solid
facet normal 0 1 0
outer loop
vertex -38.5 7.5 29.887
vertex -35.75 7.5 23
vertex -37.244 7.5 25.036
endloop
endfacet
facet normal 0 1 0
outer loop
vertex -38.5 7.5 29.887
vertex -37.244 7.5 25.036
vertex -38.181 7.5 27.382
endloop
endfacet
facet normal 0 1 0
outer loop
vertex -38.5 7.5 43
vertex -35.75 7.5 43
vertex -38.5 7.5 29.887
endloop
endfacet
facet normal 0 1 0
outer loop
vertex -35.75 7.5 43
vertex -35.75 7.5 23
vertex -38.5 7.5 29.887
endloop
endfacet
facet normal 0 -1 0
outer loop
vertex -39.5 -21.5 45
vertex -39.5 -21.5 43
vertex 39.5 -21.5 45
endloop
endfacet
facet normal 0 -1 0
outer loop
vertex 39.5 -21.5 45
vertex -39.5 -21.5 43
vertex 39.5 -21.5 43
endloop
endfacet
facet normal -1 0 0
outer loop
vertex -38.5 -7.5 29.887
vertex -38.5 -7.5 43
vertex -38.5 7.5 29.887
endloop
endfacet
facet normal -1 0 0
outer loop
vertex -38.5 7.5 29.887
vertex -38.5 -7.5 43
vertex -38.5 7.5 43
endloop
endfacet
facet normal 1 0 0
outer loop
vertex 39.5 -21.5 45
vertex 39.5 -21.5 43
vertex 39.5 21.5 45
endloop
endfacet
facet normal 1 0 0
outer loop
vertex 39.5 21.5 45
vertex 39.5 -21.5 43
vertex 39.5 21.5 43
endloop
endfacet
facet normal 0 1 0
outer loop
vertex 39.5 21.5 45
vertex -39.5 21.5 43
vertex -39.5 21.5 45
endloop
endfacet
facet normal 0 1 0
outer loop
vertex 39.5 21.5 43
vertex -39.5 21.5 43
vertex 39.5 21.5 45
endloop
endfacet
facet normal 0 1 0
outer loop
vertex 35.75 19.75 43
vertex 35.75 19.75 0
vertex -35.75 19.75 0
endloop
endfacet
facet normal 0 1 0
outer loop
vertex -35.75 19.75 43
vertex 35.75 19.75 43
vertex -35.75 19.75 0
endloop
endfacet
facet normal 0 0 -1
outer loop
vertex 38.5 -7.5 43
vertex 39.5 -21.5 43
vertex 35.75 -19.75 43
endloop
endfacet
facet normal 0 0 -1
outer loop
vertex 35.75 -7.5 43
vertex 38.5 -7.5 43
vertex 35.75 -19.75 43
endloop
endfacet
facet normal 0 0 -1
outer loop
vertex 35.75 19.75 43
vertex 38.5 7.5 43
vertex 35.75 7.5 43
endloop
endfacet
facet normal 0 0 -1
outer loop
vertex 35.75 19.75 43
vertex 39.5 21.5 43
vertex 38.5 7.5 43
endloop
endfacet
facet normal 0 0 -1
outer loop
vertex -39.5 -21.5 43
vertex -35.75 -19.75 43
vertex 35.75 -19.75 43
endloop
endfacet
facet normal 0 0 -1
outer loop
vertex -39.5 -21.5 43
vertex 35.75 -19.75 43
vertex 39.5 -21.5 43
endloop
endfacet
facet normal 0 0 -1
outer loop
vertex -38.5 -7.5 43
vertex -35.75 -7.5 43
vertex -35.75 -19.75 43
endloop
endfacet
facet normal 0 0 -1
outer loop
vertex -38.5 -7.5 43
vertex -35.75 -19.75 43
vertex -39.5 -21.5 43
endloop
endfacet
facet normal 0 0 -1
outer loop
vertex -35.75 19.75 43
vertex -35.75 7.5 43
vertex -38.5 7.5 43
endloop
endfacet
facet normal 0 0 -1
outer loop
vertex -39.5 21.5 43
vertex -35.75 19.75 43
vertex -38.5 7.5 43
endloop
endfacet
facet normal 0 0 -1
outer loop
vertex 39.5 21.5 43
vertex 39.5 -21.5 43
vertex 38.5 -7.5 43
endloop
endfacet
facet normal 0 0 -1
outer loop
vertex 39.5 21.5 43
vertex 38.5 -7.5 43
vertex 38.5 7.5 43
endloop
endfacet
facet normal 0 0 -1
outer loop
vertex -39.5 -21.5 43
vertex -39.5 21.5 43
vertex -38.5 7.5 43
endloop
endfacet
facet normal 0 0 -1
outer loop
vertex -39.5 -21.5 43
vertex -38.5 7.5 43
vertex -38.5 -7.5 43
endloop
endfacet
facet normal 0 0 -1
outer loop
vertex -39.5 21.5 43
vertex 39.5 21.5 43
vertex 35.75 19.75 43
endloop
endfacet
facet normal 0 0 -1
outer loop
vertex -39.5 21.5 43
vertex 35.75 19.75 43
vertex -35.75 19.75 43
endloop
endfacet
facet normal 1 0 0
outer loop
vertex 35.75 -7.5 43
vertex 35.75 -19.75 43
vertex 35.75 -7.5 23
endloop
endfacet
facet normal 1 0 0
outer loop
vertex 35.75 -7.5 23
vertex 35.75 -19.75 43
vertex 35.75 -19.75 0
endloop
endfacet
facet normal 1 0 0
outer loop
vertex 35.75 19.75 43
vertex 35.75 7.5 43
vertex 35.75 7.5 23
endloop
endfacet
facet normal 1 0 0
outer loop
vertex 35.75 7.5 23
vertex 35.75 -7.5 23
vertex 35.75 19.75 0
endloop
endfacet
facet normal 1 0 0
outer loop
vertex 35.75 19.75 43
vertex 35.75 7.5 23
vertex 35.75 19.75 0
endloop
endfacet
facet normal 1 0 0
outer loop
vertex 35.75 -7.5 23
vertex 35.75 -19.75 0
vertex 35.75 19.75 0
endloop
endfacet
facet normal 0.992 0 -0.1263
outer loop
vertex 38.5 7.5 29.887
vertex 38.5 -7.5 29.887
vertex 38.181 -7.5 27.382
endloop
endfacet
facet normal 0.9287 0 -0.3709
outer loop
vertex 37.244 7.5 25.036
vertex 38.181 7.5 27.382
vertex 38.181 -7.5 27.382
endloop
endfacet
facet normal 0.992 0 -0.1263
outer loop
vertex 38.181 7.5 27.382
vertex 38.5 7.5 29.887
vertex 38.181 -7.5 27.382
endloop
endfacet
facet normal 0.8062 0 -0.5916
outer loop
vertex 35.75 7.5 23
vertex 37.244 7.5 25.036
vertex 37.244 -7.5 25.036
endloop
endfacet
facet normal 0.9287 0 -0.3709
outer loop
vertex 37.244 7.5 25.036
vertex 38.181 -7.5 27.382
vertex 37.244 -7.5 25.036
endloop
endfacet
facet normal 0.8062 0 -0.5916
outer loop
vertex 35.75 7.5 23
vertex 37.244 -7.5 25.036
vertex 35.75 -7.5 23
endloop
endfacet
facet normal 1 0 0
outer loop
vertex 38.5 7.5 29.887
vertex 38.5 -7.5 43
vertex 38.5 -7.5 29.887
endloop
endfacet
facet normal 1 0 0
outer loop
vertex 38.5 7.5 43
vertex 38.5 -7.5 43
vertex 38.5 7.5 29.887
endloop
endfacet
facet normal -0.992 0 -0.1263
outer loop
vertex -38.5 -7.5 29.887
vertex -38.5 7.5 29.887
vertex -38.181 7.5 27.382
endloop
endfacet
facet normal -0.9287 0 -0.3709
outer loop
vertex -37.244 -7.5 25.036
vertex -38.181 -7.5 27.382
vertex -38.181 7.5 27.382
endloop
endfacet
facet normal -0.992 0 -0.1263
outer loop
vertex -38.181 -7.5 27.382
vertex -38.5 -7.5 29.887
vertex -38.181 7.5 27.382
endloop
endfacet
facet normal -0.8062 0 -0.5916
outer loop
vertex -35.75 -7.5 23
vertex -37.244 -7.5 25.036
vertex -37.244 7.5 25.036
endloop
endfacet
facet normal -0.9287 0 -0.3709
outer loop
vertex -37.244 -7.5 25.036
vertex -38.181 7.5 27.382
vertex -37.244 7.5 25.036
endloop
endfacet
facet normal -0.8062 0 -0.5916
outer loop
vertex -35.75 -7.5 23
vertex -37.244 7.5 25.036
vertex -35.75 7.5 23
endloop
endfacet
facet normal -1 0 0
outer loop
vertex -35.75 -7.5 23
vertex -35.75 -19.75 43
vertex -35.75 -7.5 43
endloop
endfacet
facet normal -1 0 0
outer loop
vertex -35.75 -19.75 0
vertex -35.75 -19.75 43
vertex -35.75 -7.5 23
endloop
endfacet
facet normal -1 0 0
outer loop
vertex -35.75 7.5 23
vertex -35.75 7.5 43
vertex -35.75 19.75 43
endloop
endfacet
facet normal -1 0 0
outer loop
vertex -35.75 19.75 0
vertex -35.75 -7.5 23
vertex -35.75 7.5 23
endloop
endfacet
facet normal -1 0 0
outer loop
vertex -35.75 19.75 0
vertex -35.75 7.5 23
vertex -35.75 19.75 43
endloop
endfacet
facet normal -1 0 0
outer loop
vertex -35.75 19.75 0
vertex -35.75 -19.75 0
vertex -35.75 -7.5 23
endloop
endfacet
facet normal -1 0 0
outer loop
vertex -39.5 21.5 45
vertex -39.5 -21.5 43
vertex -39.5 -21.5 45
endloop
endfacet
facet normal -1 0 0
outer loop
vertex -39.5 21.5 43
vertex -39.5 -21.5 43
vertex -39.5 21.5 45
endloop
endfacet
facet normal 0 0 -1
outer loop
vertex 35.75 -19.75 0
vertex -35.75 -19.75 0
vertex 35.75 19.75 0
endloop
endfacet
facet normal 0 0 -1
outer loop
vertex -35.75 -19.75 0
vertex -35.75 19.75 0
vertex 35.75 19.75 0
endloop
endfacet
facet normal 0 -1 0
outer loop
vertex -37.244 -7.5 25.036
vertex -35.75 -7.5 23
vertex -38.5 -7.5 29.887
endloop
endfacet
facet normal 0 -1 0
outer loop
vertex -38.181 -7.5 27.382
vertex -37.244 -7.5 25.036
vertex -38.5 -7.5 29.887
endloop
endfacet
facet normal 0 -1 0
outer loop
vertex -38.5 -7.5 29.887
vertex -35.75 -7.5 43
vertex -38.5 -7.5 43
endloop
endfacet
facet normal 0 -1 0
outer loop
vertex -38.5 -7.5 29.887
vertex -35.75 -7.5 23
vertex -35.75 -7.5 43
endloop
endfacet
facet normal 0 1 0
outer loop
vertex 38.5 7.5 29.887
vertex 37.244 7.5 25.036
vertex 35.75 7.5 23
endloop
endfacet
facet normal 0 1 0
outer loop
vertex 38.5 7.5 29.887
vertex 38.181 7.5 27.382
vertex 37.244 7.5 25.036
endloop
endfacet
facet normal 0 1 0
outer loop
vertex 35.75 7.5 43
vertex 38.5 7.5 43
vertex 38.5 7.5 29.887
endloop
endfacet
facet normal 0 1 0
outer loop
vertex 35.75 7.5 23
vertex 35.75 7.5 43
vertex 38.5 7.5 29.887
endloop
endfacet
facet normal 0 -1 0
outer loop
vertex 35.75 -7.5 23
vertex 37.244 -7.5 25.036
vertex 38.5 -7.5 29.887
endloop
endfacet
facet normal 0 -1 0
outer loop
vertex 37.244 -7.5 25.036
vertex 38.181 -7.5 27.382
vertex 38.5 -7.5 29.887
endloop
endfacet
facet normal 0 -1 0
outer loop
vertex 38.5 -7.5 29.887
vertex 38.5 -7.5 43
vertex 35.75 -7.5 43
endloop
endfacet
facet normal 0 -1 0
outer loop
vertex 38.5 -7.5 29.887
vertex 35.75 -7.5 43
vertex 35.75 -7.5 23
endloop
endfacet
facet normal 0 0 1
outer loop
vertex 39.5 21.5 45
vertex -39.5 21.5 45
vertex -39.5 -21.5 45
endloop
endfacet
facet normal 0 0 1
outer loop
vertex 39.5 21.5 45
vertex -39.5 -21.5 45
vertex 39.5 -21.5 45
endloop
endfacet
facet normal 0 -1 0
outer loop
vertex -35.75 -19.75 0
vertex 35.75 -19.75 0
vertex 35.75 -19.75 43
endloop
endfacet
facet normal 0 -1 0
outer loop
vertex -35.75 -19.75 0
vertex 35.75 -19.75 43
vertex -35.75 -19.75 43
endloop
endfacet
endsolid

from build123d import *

# Parameters (mm, degrees)
SKIZZE1_W                       = 79
SKIZZE1_H                       = 43
AUFSATZ_LINEAR_AUSTRAGEN1_DEPTH = 45
SKIZZE2_W                       = 79
SKIZZE2_H                       = 43
SKIZZE2_W_2                     = 71.5
SKIZZE2_H_2                     = 39.5
SCHNITT_LINEAR_AUSTRAGEN1_DEPTH = 43
SKIZZE3_W                       = 2.75
SKIZZE3_H                       = 15
AUFSATZ_LINEAR_AUSTRAGEN2_DEPTH = 20
VERRUNDUNG1_R                   = 10


with BuildPart() as part:
    # Skizze1 → Aufsatz-Linear austragen1 (new body)
    with BuildSketch(Plane.XY):
        Rectangle(SKIZZE1_W, SKIZZE1_H)
    extrude(amount=AUFSATZ_LINEAR_AUSTRAGEN1_DEPTH)

    # Skizze2 → Schnitt-Linear austragen1 (cut)
    with BuildSketch(Plane(origin=(0, 0, 0), x_dir=(-1, 0, 0), z_dir=(0, 0, -1))):
        Rectangle(SKIZZE2_W, SKIZZE2_H)
        Rectangle(SKIZZE2_W_2, SKIZZE2_H_2, mode=Mode.SUBTRACT)
    extrude(amount=-SCHNITT_LINEAR_AUSTRAGEN1_DEPTH, mode=Mode.SUBTRACT)

    # Skizze3 → Aufsatz-Linear austragen2 (add)
    with BuildSketch(Plane(origin=(0, 0, 43), x_dir=(-1, 0, 0), z_dir=(0, 0, -1))):
        with Locations((-37.125, 0)):
            Rectangle(SKIZZE3_W, SKIZZE3_H)
        with Locations((37.125, 0)):
            Rectangle(SKIZZE3_W, SKIZZE3_H)
    extrude(amount=AUFSATZ_LINEAR_AUSTRAGEN2_DEPTH)

    # Verrundung1
    # the kernel refuses this fillet: 10 mm, written as the material it takes off along each edge
    with BuildSketch(Plane(origin=(-38.5, 24.718721642, 23), x_dir=(0, 0, 1), z_dir=(0, -1, 0)), Plane(origin=(38.5, -24.718721642, 23), x_dir=(0, 0, 1), z_dir=(0, 1, 0))) as verrundung1_piece_1:
        with BuildLine():
            CenterArc((6.887488657, -10), VERRUNDUNG1_R, 90, 43.531152167)
            Line((0, -2.75), (-0.137749773, -2.605))
            ThreePointArc((-0.137749773, -2.605), (-0.2, -1.375), (-0.2, 0))
            Line((-0.2, 0), (0, 0.2))
            Line((0, 0.2), (6.887488657, 0.2))
            Line((6.887488657, 0.2), (6.887488657, 0))
        make_face()
    extrude(amount=49.437443285, mode=Mode.SUBTRACT)


solid = part.part
